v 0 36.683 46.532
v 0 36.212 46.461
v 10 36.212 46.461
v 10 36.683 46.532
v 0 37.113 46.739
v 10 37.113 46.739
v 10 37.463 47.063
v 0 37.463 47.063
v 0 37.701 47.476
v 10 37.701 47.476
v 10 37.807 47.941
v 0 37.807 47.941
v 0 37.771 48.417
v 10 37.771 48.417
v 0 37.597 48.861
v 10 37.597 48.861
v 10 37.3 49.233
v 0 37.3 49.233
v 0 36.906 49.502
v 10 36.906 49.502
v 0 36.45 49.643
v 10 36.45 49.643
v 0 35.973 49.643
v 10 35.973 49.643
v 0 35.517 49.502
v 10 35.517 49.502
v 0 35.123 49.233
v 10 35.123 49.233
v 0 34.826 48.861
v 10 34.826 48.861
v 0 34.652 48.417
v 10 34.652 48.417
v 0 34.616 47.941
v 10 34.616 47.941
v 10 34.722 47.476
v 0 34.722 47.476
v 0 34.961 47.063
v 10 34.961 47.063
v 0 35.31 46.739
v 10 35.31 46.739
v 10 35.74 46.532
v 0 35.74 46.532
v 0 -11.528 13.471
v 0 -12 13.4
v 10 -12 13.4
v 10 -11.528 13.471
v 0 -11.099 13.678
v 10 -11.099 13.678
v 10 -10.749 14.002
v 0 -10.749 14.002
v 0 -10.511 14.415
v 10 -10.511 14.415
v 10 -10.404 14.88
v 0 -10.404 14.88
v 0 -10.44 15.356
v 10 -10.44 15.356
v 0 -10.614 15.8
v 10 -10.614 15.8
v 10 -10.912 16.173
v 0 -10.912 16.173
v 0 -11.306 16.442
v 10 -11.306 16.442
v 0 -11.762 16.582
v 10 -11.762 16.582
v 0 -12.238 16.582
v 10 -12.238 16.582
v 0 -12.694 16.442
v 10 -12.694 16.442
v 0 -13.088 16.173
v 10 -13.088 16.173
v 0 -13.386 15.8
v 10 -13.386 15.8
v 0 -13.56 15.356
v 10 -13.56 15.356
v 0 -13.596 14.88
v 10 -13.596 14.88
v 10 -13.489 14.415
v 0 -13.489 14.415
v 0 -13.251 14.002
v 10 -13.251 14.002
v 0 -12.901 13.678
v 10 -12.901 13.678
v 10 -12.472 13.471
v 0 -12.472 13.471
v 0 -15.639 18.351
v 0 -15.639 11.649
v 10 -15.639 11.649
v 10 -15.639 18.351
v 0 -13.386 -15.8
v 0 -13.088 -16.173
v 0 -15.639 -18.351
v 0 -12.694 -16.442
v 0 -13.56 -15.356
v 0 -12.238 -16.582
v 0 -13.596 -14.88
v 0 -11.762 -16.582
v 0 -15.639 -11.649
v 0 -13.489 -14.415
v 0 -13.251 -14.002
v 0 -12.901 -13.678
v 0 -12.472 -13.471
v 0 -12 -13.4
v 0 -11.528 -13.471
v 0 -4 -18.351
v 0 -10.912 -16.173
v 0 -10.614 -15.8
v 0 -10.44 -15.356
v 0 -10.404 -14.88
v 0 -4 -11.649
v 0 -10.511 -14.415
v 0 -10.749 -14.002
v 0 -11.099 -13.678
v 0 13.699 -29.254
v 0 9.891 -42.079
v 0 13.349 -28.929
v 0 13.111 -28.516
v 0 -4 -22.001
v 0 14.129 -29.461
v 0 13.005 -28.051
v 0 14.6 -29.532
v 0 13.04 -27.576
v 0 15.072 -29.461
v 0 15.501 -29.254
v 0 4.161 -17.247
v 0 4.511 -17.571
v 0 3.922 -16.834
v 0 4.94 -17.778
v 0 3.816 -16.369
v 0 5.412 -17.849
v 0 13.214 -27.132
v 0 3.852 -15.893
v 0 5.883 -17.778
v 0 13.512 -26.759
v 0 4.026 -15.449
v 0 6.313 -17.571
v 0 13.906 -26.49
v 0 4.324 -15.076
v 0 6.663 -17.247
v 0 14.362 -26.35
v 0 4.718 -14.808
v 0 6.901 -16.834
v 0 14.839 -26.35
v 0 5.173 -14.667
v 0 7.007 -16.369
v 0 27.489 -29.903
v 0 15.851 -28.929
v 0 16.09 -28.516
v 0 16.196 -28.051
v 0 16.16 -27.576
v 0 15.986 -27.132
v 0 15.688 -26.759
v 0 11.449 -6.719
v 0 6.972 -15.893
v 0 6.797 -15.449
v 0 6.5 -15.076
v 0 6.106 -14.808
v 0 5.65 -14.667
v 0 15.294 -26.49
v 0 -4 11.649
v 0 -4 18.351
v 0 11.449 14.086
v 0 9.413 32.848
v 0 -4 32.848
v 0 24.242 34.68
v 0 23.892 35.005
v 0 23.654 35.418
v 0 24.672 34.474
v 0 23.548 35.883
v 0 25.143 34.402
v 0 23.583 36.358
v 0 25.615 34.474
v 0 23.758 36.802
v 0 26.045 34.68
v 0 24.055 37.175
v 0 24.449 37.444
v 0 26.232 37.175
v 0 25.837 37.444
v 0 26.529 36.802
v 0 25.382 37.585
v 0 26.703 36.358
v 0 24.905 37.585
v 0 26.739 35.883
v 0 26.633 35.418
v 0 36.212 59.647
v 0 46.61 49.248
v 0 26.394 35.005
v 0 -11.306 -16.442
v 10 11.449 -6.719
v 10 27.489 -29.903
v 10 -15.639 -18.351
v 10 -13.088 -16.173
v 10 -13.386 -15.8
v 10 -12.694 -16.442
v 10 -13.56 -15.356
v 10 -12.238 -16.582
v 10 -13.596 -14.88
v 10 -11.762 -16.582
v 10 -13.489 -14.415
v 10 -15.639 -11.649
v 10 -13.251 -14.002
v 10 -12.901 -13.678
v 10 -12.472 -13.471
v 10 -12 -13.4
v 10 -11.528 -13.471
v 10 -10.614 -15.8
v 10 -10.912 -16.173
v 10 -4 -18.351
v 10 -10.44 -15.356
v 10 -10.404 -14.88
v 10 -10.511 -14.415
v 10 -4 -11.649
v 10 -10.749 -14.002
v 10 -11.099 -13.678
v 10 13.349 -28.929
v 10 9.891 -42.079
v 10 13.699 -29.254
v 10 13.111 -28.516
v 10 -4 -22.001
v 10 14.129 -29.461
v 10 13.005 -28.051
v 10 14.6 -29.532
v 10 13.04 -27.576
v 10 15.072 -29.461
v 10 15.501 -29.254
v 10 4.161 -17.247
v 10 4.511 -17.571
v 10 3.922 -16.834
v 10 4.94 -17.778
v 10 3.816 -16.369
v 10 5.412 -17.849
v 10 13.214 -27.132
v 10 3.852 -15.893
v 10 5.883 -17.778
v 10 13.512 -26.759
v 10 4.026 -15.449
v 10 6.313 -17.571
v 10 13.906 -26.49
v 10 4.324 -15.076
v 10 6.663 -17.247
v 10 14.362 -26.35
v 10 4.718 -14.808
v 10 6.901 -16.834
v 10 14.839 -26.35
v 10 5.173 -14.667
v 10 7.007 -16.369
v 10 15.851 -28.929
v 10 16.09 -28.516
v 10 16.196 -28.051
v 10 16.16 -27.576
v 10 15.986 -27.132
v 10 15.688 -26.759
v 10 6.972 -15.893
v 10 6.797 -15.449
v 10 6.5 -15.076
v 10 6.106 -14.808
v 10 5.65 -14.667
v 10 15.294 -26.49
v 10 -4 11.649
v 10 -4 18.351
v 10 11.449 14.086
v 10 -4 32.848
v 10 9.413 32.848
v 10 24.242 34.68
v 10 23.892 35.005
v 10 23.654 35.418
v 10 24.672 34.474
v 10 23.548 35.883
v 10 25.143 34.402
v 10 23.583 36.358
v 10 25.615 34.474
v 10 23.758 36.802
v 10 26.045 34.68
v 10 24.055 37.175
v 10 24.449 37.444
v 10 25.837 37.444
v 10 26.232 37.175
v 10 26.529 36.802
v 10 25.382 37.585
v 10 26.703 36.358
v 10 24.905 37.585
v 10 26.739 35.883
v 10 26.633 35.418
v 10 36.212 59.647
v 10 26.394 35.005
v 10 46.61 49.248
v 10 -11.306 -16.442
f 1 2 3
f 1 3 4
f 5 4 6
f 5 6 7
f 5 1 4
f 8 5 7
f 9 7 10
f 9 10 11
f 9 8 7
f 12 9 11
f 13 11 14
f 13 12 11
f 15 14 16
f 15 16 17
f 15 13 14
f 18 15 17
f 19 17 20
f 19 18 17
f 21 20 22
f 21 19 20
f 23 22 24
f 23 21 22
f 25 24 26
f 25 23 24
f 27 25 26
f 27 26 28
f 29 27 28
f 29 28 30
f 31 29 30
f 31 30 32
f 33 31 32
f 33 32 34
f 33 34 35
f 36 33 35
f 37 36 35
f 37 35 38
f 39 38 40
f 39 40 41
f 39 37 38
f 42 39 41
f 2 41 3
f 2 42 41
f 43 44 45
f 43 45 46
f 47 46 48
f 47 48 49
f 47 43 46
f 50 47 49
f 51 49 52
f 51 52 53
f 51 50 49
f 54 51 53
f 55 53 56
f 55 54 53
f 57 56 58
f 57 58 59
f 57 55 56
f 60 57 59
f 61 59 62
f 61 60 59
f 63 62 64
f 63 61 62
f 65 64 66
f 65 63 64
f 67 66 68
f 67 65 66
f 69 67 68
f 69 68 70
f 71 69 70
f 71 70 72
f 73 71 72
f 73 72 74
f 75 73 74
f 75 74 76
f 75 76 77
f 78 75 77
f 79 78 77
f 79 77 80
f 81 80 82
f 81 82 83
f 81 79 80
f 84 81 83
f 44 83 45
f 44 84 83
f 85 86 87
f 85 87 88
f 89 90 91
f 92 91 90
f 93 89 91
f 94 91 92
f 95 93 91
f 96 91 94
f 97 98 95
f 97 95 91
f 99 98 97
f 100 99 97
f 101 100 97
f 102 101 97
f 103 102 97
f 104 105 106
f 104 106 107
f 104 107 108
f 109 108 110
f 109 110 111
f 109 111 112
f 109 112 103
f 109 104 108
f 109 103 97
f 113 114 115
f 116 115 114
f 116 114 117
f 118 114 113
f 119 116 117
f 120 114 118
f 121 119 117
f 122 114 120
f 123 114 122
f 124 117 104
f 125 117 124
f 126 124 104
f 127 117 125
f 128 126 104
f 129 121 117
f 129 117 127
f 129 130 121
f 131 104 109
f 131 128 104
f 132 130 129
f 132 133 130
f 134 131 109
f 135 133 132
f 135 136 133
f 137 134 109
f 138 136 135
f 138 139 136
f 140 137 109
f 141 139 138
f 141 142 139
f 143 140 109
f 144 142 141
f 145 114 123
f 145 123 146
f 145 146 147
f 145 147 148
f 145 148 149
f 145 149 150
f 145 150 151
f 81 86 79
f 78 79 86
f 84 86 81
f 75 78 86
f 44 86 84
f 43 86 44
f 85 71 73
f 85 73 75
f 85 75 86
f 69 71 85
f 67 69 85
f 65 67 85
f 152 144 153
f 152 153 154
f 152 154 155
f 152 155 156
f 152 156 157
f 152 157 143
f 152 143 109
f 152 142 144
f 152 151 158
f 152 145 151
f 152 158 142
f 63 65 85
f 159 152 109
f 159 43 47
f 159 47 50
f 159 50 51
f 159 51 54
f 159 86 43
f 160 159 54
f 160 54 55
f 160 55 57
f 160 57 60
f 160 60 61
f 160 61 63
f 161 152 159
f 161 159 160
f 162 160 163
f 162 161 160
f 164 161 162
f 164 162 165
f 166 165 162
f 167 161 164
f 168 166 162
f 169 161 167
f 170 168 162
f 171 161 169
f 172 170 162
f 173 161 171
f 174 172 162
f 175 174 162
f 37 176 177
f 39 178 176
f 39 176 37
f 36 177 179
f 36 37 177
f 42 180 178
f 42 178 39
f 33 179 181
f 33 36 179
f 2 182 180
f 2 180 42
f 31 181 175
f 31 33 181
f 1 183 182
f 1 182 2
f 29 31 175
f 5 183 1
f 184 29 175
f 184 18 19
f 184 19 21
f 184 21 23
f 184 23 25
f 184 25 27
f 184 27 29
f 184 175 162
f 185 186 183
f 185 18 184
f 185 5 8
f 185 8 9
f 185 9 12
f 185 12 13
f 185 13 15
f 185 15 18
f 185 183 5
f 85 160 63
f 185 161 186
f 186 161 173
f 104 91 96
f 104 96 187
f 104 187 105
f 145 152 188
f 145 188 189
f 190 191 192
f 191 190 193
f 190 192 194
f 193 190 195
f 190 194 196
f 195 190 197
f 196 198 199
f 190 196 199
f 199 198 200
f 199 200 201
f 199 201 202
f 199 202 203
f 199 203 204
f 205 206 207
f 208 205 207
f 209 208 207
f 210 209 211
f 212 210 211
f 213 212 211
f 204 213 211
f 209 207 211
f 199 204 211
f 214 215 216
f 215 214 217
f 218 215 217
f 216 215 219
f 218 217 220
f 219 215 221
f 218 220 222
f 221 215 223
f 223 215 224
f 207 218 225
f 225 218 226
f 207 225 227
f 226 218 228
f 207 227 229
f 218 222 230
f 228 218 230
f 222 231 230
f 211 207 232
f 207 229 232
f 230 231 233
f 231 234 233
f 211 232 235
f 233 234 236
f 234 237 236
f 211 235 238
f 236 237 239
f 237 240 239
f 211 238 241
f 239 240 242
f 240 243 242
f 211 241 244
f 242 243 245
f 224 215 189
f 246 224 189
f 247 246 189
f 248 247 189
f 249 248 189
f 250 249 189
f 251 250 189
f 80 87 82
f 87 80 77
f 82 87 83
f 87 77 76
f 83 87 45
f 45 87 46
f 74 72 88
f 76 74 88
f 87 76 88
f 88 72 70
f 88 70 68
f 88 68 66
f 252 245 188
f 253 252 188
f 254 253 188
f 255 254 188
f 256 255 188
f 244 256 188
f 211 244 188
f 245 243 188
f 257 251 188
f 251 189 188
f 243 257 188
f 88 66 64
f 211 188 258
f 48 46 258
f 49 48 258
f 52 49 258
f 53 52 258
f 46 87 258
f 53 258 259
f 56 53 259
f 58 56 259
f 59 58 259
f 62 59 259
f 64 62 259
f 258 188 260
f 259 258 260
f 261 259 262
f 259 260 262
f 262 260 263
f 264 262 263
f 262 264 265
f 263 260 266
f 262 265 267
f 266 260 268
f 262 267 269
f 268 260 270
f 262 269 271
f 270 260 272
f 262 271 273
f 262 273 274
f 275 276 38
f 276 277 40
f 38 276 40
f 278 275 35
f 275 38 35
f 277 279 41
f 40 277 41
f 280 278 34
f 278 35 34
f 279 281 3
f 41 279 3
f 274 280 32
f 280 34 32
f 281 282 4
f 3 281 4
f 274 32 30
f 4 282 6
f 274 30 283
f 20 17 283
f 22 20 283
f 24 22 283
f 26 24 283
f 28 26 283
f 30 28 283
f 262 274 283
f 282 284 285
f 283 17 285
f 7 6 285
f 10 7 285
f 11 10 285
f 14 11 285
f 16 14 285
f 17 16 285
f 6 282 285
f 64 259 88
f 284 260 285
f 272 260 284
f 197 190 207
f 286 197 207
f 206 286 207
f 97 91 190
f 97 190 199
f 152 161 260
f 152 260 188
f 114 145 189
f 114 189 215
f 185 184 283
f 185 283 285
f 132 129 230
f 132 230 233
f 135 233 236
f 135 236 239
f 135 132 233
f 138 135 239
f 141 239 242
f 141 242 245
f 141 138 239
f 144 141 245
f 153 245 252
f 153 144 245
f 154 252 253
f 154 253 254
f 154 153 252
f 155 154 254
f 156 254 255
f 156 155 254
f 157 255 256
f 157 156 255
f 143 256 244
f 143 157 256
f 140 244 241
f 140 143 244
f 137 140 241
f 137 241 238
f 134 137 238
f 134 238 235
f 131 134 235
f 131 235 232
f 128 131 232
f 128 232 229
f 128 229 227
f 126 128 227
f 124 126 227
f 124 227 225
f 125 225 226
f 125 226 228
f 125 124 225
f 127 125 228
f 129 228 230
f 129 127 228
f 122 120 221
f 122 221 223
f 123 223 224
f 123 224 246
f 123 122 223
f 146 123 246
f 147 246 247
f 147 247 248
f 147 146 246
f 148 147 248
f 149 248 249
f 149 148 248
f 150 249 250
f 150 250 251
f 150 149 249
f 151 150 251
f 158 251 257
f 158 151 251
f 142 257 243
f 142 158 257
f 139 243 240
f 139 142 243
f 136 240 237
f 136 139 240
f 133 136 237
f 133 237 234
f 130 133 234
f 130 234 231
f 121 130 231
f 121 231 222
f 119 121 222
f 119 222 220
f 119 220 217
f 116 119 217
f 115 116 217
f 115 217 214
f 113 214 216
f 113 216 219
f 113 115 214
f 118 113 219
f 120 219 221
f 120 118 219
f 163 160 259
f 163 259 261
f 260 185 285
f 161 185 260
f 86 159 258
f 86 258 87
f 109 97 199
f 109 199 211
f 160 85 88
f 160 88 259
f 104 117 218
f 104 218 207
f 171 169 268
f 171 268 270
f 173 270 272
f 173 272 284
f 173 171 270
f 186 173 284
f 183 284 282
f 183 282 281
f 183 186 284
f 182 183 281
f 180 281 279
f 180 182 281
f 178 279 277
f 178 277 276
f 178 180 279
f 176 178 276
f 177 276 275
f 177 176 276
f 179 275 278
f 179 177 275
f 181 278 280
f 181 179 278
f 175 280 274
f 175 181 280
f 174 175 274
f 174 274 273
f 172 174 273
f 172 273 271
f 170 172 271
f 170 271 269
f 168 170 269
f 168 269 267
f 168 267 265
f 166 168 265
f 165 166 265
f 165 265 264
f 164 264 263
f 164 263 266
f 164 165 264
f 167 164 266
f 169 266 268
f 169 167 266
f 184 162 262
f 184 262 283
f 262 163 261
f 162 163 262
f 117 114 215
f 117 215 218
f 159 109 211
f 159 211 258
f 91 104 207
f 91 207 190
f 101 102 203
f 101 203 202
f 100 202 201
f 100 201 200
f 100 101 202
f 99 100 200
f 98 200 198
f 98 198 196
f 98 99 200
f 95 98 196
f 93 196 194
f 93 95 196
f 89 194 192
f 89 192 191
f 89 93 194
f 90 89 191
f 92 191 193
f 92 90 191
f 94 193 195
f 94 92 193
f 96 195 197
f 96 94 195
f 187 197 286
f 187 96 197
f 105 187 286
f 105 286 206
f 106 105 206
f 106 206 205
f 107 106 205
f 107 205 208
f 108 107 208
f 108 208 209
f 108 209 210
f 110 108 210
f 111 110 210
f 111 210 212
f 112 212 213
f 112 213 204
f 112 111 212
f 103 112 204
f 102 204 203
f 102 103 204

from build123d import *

# Parameters (mm, degrees)
SKETCH_1_R      = 1.6
EXTRUDE_1_DEPTH = 10


with BuildPart() as part:
    # 草图1 → 凸台-拉伸1 (new body)
    with BuildSketch(Plane(origin=(0, 0, 0), x_dir=(0, 0, -1), z_dir=(1, 0, 0))):
        Polygon((-11.648969443, -15.638868598), (-18.351030557, -15.638868598), (-18.351030557, -4), (-32.84837567, -4), (-32.84837567, 9.413253291), (-59.646723814, 36.211601436), (-49.248051864, 46.610273387), (-14.086489785, 11.448711308), (6.718740299, 11.448711308), (29.902965659, 27.489458326), (42.078824949, 9.89128379), (22.001290309, -4), (18.351030557, -4), (18.351030557, -15.638868598), (11.648969443, -15.638868598), (11.648969443, -4), (-11.648969443, -4), align=None)
        with Locations((-15, -12)):
            Circle(SKETCH_1_R, mode=Mode.SUBTRACT)
        with Locations(Location((15, -12, 0), (0, 0, 180))):
            Circle(SKETCH_1_R, mode=Mode.SUBTRACT)
        with Locations((-48.060514381, 36.211601436)):
            Circle(SKETCH_1_R, mode=Mode.SUBTRACT)
        with Locations((-36.002441477, 25.143249656)):
            Circle(SKETCH_1_R, mode=Mode.SUBTRACT)
        with Locations((16.249207774, 5.411857631)):
            Circle(SKETCH_1_R, mode=Mode.SUBTRACT)
        with Locations((27.931653437, 14.600109184)):
            Circle(SKETCH_1_R, mode=Mode.SUBTRACT)
    extrude(amount=EXTRUDE_1_DEPTH)


solid = part.part
